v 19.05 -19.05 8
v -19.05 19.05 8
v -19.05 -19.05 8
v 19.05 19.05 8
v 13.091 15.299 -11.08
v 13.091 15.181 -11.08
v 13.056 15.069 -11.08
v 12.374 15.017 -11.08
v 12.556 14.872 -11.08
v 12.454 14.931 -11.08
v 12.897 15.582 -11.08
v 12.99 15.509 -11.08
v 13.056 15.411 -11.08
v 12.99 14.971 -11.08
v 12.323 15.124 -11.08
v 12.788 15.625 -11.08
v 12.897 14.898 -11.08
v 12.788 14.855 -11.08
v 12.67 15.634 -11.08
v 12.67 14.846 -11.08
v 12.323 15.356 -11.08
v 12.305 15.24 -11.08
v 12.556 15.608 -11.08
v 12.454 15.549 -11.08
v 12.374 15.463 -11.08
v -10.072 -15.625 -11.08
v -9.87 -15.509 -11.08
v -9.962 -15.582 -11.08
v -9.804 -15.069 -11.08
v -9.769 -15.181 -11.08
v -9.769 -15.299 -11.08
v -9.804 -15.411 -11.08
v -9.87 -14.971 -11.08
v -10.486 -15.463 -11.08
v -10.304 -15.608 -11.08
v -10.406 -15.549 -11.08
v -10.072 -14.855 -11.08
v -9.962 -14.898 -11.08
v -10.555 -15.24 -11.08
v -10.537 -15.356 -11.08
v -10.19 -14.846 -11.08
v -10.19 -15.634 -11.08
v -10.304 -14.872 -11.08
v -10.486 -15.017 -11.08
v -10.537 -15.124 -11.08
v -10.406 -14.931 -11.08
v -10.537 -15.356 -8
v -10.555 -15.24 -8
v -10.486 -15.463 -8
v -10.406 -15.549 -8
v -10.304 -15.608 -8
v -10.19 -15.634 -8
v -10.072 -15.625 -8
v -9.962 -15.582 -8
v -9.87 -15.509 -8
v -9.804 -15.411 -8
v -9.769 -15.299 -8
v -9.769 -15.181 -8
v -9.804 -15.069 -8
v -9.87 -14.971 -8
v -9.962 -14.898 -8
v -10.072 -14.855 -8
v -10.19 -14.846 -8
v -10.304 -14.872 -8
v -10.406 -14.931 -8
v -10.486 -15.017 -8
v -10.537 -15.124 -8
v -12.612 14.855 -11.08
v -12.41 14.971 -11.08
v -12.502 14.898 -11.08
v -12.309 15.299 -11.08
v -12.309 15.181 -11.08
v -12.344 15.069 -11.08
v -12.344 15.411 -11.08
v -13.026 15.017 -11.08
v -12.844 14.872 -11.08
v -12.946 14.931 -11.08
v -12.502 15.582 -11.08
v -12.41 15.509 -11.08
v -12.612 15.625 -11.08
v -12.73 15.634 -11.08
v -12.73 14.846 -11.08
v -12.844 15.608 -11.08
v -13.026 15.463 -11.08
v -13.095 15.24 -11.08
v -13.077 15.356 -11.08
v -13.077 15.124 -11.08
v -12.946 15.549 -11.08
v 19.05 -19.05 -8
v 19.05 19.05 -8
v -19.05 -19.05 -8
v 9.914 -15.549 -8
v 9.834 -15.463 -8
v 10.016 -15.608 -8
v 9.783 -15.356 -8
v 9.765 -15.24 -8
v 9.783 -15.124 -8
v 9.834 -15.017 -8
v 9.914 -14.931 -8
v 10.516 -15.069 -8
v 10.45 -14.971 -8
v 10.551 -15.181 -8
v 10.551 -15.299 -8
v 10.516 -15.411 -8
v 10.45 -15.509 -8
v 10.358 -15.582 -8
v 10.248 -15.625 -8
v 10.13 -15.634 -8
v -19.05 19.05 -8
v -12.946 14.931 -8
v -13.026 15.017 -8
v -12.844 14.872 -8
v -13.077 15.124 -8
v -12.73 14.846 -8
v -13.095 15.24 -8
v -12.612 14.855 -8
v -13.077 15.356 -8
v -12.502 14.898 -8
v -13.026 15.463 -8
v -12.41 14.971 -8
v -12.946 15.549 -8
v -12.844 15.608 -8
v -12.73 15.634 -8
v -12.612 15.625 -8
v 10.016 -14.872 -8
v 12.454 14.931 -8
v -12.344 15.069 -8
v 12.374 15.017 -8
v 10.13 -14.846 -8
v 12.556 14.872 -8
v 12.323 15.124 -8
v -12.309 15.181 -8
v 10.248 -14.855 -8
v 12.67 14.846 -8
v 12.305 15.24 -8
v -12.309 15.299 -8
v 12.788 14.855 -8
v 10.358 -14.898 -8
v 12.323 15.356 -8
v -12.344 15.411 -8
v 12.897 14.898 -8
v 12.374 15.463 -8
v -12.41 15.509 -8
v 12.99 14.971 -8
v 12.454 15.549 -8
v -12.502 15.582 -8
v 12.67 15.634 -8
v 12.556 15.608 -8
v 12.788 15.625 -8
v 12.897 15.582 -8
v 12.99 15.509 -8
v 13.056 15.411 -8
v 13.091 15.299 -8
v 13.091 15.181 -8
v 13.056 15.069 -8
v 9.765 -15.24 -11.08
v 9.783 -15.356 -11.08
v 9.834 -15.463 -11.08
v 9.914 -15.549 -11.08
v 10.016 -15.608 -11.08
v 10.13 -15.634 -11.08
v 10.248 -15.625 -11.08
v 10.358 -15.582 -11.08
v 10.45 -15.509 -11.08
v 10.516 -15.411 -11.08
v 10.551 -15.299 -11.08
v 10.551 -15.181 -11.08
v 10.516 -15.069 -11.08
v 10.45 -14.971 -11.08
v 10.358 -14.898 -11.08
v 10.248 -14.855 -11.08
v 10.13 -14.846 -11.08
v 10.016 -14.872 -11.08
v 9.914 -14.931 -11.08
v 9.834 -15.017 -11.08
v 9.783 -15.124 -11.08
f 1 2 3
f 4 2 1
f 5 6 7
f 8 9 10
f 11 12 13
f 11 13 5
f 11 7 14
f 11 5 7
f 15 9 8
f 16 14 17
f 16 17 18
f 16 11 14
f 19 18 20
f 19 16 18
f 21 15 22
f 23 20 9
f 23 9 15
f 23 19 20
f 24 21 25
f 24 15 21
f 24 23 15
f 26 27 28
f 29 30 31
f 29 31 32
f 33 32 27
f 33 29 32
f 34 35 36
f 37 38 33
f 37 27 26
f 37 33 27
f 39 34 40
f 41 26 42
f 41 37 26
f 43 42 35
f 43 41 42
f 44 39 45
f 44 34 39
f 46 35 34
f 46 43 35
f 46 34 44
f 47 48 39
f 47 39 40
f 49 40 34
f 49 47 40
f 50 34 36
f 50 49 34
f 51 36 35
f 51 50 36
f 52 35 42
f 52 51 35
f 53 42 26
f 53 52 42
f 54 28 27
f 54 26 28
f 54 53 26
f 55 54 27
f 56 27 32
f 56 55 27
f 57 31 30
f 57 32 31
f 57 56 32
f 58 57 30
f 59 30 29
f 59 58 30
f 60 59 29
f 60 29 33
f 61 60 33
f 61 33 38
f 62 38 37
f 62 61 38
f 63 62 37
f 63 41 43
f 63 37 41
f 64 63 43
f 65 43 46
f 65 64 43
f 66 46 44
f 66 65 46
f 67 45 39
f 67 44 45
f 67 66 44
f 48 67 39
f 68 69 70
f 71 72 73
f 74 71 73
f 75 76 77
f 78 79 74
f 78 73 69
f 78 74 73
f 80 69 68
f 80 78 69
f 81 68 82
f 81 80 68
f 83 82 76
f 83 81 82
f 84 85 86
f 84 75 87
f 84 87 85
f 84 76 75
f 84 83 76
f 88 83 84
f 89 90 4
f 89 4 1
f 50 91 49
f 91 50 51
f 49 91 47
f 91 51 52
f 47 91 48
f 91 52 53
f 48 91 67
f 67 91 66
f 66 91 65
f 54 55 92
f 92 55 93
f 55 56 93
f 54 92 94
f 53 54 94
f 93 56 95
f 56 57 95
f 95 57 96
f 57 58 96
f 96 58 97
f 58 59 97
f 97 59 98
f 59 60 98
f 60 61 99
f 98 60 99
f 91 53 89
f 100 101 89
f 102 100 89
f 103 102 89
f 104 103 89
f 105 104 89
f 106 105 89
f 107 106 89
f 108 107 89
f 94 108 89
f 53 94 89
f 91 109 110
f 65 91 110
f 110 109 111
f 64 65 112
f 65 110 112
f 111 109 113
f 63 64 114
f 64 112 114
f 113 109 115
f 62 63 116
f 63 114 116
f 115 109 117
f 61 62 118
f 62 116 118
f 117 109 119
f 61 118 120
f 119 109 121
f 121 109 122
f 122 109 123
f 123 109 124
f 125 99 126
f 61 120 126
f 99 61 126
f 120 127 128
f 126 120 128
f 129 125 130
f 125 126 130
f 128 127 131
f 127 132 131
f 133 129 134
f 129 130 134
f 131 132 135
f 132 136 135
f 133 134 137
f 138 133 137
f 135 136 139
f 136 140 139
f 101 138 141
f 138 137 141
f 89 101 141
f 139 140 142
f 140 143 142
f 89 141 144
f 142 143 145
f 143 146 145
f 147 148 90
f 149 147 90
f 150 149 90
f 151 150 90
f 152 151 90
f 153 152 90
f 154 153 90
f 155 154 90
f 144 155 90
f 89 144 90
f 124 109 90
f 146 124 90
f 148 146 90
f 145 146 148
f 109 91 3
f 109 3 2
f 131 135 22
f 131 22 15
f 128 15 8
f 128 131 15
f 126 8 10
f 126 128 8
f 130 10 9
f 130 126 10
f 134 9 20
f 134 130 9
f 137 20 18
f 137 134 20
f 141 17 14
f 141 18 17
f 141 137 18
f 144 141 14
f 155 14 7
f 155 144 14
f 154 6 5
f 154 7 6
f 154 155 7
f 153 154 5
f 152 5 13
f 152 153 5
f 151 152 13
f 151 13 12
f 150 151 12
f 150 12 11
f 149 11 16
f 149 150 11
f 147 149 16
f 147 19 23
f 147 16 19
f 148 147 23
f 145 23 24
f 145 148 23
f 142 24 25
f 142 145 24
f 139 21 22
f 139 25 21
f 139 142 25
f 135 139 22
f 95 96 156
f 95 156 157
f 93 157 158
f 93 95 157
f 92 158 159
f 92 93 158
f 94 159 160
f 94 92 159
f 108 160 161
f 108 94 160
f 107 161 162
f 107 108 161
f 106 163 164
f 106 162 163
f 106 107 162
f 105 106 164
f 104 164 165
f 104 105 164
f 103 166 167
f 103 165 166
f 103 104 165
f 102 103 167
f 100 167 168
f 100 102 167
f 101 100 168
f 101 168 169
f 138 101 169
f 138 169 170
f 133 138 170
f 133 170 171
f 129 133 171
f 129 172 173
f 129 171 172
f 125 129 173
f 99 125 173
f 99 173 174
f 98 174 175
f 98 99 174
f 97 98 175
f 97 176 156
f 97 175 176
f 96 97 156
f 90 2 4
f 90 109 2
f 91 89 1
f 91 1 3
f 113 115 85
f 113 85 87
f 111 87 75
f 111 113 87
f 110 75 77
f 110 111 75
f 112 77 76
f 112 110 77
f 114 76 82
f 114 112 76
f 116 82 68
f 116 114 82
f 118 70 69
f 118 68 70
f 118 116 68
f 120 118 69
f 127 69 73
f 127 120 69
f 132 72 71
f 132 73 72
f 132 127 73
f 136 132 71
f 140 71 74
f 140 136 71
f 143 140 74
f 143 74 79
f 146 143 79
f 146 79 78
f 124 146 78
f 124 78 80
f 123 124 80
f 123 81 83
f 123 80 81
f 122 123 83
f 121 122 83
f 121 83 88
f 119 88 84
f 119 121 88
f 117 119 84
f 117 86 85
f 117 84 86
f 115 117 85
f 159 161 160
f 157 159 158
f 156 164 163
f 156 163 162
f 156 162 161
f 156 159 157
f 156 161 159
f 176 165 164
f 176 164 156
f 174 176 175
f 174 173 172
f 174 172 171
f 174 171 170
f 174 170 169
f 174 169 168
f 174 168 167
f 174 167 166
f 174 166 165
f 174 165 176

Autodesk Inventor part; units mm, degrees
ref_plane "YZ Plane" through (0, 0, 0) normal (1, 0, 0) x (0, 1, 0)
ref_plane "XZ Plane" through (0, 0, 0) normal (0, 1, 0) x (-1, 0, 0)
ref_plane "XY Plane" through (0, 0, 0) normal (0, 0, 1) x (1, 0, 0)
sketch "Skizze1" plane through (0, 0, 0) normal (0, 0, 1) x (1, 0, 0)
  line L0 (-19.05, 19.05) -> (19.05, 19.05)
  line L1 (19.05, 19.05) -> (19.05, -19.05)
  line L2 (19.05, -19.05) -> (-19.05, -19.05)
  line L3 (-19.05, -19.05) -> (-19.05, 19.05)
  line L4 (-19.05, 19.05) -> (19.05, -19.05) construction
  point P0 (0, 0)
  point P1 (0, 0)
  dimension "d0" = 38.1
  dimension "d1" = 38.1
extrude "Extrusion1" add sketch "Skizze1" along normal mid plane 16
sketch "Skizze2" plane through (0, 0, -8) normal (0, 0, -1) x (-1, 0, 0)
  line L0 (19.05, 19.05) -> (-19.05, 19.05) construction
  line L1 (-19.05, 19.05) -> (-19.05, -19.05) construction
  line L2 (-19.05, -19.05) -> (19.05, -19.05) construction
  line L3 (19.05, -19.05) -> (19.05, 19.05) construction
  line L4 (-19.05, -19.05) -> (-19.05, 19.05) construction
  line L5 (-19.05, -19.05) -> (-19.05, -15.24) construction
  line L6 (19.05, -19.05) -> (-19.05, -19.05) construction
  line L7 (19.05, -19.05) -> (19.05, -15.24) construction
  line L8 (19.05, 19.05) -> (19.05, -19.05) construction
  line L9 (-19.05, -15.24) -> (-10.16, -15.24) construction
  line L10 (19.05, -15.24) -> (10.16, -15.24) construction
  line L11 (-19.05, 19.05) -> (19.05, 19.05) construction
  line L12 (-19.05, 19.05) -> (-19.05, 15.24) construction
  line L13 (-19.05, 15.24) -> (-12.7, 15.24) construction
  line L14 (19.05, 19.05) -> (19.05, 15.24) construction
  line L15 (19.05, 15.24) -> (12.7, 15.24) construction
  circle A0 centre (-10.16, -15.24) radius 0.395
  circle A1 centre (-12.7, 15.24) radius 0.395
  circle A2 centre (12.7, 15.24) radius 0.395
  circle A3 centre (10.16, -15.24) radius 0.395
  point P0 (0, 0)
  dimension "d4" = 3.81
  dimension "d5" = 3.81
  dimension "d8" = 8.89
  dimension "d9" = 8.89
  dimension "d10" = 3.81
  dimension "d11" = 6.35
  dimension "d12" = 3.81
  dimension "d13" = 6.35
  dimension "d14" = 0.79
  dimension "d15" = 0.79
  dimension "d16" = 0.79
  dimension "d17" = 0.79
extrude "Extrusion4" add sketch "Skizze2" along normal blind 5.08
sketch "Skizze3" plane through (10.16, -15.24, -13.08) normal (0, 0, -1) x (-1, 0, 0)
  circle A0 centre (0, 0) radius 0.395 projected
  circle A1 centre (20.32, 0) radius 0.395 projected
  circle A2 centre (22.86, 30.48) radius 0.395 projected
  circle A3 centre (-2.54, 30.48) radius 0.395 projected
  point P0 (10.16, 15.24)
extrude "Extrusion5" cut sketch "Skizze3" against normal blind 2
properties part number "DC DC converter (M1730CQEA06065)"
